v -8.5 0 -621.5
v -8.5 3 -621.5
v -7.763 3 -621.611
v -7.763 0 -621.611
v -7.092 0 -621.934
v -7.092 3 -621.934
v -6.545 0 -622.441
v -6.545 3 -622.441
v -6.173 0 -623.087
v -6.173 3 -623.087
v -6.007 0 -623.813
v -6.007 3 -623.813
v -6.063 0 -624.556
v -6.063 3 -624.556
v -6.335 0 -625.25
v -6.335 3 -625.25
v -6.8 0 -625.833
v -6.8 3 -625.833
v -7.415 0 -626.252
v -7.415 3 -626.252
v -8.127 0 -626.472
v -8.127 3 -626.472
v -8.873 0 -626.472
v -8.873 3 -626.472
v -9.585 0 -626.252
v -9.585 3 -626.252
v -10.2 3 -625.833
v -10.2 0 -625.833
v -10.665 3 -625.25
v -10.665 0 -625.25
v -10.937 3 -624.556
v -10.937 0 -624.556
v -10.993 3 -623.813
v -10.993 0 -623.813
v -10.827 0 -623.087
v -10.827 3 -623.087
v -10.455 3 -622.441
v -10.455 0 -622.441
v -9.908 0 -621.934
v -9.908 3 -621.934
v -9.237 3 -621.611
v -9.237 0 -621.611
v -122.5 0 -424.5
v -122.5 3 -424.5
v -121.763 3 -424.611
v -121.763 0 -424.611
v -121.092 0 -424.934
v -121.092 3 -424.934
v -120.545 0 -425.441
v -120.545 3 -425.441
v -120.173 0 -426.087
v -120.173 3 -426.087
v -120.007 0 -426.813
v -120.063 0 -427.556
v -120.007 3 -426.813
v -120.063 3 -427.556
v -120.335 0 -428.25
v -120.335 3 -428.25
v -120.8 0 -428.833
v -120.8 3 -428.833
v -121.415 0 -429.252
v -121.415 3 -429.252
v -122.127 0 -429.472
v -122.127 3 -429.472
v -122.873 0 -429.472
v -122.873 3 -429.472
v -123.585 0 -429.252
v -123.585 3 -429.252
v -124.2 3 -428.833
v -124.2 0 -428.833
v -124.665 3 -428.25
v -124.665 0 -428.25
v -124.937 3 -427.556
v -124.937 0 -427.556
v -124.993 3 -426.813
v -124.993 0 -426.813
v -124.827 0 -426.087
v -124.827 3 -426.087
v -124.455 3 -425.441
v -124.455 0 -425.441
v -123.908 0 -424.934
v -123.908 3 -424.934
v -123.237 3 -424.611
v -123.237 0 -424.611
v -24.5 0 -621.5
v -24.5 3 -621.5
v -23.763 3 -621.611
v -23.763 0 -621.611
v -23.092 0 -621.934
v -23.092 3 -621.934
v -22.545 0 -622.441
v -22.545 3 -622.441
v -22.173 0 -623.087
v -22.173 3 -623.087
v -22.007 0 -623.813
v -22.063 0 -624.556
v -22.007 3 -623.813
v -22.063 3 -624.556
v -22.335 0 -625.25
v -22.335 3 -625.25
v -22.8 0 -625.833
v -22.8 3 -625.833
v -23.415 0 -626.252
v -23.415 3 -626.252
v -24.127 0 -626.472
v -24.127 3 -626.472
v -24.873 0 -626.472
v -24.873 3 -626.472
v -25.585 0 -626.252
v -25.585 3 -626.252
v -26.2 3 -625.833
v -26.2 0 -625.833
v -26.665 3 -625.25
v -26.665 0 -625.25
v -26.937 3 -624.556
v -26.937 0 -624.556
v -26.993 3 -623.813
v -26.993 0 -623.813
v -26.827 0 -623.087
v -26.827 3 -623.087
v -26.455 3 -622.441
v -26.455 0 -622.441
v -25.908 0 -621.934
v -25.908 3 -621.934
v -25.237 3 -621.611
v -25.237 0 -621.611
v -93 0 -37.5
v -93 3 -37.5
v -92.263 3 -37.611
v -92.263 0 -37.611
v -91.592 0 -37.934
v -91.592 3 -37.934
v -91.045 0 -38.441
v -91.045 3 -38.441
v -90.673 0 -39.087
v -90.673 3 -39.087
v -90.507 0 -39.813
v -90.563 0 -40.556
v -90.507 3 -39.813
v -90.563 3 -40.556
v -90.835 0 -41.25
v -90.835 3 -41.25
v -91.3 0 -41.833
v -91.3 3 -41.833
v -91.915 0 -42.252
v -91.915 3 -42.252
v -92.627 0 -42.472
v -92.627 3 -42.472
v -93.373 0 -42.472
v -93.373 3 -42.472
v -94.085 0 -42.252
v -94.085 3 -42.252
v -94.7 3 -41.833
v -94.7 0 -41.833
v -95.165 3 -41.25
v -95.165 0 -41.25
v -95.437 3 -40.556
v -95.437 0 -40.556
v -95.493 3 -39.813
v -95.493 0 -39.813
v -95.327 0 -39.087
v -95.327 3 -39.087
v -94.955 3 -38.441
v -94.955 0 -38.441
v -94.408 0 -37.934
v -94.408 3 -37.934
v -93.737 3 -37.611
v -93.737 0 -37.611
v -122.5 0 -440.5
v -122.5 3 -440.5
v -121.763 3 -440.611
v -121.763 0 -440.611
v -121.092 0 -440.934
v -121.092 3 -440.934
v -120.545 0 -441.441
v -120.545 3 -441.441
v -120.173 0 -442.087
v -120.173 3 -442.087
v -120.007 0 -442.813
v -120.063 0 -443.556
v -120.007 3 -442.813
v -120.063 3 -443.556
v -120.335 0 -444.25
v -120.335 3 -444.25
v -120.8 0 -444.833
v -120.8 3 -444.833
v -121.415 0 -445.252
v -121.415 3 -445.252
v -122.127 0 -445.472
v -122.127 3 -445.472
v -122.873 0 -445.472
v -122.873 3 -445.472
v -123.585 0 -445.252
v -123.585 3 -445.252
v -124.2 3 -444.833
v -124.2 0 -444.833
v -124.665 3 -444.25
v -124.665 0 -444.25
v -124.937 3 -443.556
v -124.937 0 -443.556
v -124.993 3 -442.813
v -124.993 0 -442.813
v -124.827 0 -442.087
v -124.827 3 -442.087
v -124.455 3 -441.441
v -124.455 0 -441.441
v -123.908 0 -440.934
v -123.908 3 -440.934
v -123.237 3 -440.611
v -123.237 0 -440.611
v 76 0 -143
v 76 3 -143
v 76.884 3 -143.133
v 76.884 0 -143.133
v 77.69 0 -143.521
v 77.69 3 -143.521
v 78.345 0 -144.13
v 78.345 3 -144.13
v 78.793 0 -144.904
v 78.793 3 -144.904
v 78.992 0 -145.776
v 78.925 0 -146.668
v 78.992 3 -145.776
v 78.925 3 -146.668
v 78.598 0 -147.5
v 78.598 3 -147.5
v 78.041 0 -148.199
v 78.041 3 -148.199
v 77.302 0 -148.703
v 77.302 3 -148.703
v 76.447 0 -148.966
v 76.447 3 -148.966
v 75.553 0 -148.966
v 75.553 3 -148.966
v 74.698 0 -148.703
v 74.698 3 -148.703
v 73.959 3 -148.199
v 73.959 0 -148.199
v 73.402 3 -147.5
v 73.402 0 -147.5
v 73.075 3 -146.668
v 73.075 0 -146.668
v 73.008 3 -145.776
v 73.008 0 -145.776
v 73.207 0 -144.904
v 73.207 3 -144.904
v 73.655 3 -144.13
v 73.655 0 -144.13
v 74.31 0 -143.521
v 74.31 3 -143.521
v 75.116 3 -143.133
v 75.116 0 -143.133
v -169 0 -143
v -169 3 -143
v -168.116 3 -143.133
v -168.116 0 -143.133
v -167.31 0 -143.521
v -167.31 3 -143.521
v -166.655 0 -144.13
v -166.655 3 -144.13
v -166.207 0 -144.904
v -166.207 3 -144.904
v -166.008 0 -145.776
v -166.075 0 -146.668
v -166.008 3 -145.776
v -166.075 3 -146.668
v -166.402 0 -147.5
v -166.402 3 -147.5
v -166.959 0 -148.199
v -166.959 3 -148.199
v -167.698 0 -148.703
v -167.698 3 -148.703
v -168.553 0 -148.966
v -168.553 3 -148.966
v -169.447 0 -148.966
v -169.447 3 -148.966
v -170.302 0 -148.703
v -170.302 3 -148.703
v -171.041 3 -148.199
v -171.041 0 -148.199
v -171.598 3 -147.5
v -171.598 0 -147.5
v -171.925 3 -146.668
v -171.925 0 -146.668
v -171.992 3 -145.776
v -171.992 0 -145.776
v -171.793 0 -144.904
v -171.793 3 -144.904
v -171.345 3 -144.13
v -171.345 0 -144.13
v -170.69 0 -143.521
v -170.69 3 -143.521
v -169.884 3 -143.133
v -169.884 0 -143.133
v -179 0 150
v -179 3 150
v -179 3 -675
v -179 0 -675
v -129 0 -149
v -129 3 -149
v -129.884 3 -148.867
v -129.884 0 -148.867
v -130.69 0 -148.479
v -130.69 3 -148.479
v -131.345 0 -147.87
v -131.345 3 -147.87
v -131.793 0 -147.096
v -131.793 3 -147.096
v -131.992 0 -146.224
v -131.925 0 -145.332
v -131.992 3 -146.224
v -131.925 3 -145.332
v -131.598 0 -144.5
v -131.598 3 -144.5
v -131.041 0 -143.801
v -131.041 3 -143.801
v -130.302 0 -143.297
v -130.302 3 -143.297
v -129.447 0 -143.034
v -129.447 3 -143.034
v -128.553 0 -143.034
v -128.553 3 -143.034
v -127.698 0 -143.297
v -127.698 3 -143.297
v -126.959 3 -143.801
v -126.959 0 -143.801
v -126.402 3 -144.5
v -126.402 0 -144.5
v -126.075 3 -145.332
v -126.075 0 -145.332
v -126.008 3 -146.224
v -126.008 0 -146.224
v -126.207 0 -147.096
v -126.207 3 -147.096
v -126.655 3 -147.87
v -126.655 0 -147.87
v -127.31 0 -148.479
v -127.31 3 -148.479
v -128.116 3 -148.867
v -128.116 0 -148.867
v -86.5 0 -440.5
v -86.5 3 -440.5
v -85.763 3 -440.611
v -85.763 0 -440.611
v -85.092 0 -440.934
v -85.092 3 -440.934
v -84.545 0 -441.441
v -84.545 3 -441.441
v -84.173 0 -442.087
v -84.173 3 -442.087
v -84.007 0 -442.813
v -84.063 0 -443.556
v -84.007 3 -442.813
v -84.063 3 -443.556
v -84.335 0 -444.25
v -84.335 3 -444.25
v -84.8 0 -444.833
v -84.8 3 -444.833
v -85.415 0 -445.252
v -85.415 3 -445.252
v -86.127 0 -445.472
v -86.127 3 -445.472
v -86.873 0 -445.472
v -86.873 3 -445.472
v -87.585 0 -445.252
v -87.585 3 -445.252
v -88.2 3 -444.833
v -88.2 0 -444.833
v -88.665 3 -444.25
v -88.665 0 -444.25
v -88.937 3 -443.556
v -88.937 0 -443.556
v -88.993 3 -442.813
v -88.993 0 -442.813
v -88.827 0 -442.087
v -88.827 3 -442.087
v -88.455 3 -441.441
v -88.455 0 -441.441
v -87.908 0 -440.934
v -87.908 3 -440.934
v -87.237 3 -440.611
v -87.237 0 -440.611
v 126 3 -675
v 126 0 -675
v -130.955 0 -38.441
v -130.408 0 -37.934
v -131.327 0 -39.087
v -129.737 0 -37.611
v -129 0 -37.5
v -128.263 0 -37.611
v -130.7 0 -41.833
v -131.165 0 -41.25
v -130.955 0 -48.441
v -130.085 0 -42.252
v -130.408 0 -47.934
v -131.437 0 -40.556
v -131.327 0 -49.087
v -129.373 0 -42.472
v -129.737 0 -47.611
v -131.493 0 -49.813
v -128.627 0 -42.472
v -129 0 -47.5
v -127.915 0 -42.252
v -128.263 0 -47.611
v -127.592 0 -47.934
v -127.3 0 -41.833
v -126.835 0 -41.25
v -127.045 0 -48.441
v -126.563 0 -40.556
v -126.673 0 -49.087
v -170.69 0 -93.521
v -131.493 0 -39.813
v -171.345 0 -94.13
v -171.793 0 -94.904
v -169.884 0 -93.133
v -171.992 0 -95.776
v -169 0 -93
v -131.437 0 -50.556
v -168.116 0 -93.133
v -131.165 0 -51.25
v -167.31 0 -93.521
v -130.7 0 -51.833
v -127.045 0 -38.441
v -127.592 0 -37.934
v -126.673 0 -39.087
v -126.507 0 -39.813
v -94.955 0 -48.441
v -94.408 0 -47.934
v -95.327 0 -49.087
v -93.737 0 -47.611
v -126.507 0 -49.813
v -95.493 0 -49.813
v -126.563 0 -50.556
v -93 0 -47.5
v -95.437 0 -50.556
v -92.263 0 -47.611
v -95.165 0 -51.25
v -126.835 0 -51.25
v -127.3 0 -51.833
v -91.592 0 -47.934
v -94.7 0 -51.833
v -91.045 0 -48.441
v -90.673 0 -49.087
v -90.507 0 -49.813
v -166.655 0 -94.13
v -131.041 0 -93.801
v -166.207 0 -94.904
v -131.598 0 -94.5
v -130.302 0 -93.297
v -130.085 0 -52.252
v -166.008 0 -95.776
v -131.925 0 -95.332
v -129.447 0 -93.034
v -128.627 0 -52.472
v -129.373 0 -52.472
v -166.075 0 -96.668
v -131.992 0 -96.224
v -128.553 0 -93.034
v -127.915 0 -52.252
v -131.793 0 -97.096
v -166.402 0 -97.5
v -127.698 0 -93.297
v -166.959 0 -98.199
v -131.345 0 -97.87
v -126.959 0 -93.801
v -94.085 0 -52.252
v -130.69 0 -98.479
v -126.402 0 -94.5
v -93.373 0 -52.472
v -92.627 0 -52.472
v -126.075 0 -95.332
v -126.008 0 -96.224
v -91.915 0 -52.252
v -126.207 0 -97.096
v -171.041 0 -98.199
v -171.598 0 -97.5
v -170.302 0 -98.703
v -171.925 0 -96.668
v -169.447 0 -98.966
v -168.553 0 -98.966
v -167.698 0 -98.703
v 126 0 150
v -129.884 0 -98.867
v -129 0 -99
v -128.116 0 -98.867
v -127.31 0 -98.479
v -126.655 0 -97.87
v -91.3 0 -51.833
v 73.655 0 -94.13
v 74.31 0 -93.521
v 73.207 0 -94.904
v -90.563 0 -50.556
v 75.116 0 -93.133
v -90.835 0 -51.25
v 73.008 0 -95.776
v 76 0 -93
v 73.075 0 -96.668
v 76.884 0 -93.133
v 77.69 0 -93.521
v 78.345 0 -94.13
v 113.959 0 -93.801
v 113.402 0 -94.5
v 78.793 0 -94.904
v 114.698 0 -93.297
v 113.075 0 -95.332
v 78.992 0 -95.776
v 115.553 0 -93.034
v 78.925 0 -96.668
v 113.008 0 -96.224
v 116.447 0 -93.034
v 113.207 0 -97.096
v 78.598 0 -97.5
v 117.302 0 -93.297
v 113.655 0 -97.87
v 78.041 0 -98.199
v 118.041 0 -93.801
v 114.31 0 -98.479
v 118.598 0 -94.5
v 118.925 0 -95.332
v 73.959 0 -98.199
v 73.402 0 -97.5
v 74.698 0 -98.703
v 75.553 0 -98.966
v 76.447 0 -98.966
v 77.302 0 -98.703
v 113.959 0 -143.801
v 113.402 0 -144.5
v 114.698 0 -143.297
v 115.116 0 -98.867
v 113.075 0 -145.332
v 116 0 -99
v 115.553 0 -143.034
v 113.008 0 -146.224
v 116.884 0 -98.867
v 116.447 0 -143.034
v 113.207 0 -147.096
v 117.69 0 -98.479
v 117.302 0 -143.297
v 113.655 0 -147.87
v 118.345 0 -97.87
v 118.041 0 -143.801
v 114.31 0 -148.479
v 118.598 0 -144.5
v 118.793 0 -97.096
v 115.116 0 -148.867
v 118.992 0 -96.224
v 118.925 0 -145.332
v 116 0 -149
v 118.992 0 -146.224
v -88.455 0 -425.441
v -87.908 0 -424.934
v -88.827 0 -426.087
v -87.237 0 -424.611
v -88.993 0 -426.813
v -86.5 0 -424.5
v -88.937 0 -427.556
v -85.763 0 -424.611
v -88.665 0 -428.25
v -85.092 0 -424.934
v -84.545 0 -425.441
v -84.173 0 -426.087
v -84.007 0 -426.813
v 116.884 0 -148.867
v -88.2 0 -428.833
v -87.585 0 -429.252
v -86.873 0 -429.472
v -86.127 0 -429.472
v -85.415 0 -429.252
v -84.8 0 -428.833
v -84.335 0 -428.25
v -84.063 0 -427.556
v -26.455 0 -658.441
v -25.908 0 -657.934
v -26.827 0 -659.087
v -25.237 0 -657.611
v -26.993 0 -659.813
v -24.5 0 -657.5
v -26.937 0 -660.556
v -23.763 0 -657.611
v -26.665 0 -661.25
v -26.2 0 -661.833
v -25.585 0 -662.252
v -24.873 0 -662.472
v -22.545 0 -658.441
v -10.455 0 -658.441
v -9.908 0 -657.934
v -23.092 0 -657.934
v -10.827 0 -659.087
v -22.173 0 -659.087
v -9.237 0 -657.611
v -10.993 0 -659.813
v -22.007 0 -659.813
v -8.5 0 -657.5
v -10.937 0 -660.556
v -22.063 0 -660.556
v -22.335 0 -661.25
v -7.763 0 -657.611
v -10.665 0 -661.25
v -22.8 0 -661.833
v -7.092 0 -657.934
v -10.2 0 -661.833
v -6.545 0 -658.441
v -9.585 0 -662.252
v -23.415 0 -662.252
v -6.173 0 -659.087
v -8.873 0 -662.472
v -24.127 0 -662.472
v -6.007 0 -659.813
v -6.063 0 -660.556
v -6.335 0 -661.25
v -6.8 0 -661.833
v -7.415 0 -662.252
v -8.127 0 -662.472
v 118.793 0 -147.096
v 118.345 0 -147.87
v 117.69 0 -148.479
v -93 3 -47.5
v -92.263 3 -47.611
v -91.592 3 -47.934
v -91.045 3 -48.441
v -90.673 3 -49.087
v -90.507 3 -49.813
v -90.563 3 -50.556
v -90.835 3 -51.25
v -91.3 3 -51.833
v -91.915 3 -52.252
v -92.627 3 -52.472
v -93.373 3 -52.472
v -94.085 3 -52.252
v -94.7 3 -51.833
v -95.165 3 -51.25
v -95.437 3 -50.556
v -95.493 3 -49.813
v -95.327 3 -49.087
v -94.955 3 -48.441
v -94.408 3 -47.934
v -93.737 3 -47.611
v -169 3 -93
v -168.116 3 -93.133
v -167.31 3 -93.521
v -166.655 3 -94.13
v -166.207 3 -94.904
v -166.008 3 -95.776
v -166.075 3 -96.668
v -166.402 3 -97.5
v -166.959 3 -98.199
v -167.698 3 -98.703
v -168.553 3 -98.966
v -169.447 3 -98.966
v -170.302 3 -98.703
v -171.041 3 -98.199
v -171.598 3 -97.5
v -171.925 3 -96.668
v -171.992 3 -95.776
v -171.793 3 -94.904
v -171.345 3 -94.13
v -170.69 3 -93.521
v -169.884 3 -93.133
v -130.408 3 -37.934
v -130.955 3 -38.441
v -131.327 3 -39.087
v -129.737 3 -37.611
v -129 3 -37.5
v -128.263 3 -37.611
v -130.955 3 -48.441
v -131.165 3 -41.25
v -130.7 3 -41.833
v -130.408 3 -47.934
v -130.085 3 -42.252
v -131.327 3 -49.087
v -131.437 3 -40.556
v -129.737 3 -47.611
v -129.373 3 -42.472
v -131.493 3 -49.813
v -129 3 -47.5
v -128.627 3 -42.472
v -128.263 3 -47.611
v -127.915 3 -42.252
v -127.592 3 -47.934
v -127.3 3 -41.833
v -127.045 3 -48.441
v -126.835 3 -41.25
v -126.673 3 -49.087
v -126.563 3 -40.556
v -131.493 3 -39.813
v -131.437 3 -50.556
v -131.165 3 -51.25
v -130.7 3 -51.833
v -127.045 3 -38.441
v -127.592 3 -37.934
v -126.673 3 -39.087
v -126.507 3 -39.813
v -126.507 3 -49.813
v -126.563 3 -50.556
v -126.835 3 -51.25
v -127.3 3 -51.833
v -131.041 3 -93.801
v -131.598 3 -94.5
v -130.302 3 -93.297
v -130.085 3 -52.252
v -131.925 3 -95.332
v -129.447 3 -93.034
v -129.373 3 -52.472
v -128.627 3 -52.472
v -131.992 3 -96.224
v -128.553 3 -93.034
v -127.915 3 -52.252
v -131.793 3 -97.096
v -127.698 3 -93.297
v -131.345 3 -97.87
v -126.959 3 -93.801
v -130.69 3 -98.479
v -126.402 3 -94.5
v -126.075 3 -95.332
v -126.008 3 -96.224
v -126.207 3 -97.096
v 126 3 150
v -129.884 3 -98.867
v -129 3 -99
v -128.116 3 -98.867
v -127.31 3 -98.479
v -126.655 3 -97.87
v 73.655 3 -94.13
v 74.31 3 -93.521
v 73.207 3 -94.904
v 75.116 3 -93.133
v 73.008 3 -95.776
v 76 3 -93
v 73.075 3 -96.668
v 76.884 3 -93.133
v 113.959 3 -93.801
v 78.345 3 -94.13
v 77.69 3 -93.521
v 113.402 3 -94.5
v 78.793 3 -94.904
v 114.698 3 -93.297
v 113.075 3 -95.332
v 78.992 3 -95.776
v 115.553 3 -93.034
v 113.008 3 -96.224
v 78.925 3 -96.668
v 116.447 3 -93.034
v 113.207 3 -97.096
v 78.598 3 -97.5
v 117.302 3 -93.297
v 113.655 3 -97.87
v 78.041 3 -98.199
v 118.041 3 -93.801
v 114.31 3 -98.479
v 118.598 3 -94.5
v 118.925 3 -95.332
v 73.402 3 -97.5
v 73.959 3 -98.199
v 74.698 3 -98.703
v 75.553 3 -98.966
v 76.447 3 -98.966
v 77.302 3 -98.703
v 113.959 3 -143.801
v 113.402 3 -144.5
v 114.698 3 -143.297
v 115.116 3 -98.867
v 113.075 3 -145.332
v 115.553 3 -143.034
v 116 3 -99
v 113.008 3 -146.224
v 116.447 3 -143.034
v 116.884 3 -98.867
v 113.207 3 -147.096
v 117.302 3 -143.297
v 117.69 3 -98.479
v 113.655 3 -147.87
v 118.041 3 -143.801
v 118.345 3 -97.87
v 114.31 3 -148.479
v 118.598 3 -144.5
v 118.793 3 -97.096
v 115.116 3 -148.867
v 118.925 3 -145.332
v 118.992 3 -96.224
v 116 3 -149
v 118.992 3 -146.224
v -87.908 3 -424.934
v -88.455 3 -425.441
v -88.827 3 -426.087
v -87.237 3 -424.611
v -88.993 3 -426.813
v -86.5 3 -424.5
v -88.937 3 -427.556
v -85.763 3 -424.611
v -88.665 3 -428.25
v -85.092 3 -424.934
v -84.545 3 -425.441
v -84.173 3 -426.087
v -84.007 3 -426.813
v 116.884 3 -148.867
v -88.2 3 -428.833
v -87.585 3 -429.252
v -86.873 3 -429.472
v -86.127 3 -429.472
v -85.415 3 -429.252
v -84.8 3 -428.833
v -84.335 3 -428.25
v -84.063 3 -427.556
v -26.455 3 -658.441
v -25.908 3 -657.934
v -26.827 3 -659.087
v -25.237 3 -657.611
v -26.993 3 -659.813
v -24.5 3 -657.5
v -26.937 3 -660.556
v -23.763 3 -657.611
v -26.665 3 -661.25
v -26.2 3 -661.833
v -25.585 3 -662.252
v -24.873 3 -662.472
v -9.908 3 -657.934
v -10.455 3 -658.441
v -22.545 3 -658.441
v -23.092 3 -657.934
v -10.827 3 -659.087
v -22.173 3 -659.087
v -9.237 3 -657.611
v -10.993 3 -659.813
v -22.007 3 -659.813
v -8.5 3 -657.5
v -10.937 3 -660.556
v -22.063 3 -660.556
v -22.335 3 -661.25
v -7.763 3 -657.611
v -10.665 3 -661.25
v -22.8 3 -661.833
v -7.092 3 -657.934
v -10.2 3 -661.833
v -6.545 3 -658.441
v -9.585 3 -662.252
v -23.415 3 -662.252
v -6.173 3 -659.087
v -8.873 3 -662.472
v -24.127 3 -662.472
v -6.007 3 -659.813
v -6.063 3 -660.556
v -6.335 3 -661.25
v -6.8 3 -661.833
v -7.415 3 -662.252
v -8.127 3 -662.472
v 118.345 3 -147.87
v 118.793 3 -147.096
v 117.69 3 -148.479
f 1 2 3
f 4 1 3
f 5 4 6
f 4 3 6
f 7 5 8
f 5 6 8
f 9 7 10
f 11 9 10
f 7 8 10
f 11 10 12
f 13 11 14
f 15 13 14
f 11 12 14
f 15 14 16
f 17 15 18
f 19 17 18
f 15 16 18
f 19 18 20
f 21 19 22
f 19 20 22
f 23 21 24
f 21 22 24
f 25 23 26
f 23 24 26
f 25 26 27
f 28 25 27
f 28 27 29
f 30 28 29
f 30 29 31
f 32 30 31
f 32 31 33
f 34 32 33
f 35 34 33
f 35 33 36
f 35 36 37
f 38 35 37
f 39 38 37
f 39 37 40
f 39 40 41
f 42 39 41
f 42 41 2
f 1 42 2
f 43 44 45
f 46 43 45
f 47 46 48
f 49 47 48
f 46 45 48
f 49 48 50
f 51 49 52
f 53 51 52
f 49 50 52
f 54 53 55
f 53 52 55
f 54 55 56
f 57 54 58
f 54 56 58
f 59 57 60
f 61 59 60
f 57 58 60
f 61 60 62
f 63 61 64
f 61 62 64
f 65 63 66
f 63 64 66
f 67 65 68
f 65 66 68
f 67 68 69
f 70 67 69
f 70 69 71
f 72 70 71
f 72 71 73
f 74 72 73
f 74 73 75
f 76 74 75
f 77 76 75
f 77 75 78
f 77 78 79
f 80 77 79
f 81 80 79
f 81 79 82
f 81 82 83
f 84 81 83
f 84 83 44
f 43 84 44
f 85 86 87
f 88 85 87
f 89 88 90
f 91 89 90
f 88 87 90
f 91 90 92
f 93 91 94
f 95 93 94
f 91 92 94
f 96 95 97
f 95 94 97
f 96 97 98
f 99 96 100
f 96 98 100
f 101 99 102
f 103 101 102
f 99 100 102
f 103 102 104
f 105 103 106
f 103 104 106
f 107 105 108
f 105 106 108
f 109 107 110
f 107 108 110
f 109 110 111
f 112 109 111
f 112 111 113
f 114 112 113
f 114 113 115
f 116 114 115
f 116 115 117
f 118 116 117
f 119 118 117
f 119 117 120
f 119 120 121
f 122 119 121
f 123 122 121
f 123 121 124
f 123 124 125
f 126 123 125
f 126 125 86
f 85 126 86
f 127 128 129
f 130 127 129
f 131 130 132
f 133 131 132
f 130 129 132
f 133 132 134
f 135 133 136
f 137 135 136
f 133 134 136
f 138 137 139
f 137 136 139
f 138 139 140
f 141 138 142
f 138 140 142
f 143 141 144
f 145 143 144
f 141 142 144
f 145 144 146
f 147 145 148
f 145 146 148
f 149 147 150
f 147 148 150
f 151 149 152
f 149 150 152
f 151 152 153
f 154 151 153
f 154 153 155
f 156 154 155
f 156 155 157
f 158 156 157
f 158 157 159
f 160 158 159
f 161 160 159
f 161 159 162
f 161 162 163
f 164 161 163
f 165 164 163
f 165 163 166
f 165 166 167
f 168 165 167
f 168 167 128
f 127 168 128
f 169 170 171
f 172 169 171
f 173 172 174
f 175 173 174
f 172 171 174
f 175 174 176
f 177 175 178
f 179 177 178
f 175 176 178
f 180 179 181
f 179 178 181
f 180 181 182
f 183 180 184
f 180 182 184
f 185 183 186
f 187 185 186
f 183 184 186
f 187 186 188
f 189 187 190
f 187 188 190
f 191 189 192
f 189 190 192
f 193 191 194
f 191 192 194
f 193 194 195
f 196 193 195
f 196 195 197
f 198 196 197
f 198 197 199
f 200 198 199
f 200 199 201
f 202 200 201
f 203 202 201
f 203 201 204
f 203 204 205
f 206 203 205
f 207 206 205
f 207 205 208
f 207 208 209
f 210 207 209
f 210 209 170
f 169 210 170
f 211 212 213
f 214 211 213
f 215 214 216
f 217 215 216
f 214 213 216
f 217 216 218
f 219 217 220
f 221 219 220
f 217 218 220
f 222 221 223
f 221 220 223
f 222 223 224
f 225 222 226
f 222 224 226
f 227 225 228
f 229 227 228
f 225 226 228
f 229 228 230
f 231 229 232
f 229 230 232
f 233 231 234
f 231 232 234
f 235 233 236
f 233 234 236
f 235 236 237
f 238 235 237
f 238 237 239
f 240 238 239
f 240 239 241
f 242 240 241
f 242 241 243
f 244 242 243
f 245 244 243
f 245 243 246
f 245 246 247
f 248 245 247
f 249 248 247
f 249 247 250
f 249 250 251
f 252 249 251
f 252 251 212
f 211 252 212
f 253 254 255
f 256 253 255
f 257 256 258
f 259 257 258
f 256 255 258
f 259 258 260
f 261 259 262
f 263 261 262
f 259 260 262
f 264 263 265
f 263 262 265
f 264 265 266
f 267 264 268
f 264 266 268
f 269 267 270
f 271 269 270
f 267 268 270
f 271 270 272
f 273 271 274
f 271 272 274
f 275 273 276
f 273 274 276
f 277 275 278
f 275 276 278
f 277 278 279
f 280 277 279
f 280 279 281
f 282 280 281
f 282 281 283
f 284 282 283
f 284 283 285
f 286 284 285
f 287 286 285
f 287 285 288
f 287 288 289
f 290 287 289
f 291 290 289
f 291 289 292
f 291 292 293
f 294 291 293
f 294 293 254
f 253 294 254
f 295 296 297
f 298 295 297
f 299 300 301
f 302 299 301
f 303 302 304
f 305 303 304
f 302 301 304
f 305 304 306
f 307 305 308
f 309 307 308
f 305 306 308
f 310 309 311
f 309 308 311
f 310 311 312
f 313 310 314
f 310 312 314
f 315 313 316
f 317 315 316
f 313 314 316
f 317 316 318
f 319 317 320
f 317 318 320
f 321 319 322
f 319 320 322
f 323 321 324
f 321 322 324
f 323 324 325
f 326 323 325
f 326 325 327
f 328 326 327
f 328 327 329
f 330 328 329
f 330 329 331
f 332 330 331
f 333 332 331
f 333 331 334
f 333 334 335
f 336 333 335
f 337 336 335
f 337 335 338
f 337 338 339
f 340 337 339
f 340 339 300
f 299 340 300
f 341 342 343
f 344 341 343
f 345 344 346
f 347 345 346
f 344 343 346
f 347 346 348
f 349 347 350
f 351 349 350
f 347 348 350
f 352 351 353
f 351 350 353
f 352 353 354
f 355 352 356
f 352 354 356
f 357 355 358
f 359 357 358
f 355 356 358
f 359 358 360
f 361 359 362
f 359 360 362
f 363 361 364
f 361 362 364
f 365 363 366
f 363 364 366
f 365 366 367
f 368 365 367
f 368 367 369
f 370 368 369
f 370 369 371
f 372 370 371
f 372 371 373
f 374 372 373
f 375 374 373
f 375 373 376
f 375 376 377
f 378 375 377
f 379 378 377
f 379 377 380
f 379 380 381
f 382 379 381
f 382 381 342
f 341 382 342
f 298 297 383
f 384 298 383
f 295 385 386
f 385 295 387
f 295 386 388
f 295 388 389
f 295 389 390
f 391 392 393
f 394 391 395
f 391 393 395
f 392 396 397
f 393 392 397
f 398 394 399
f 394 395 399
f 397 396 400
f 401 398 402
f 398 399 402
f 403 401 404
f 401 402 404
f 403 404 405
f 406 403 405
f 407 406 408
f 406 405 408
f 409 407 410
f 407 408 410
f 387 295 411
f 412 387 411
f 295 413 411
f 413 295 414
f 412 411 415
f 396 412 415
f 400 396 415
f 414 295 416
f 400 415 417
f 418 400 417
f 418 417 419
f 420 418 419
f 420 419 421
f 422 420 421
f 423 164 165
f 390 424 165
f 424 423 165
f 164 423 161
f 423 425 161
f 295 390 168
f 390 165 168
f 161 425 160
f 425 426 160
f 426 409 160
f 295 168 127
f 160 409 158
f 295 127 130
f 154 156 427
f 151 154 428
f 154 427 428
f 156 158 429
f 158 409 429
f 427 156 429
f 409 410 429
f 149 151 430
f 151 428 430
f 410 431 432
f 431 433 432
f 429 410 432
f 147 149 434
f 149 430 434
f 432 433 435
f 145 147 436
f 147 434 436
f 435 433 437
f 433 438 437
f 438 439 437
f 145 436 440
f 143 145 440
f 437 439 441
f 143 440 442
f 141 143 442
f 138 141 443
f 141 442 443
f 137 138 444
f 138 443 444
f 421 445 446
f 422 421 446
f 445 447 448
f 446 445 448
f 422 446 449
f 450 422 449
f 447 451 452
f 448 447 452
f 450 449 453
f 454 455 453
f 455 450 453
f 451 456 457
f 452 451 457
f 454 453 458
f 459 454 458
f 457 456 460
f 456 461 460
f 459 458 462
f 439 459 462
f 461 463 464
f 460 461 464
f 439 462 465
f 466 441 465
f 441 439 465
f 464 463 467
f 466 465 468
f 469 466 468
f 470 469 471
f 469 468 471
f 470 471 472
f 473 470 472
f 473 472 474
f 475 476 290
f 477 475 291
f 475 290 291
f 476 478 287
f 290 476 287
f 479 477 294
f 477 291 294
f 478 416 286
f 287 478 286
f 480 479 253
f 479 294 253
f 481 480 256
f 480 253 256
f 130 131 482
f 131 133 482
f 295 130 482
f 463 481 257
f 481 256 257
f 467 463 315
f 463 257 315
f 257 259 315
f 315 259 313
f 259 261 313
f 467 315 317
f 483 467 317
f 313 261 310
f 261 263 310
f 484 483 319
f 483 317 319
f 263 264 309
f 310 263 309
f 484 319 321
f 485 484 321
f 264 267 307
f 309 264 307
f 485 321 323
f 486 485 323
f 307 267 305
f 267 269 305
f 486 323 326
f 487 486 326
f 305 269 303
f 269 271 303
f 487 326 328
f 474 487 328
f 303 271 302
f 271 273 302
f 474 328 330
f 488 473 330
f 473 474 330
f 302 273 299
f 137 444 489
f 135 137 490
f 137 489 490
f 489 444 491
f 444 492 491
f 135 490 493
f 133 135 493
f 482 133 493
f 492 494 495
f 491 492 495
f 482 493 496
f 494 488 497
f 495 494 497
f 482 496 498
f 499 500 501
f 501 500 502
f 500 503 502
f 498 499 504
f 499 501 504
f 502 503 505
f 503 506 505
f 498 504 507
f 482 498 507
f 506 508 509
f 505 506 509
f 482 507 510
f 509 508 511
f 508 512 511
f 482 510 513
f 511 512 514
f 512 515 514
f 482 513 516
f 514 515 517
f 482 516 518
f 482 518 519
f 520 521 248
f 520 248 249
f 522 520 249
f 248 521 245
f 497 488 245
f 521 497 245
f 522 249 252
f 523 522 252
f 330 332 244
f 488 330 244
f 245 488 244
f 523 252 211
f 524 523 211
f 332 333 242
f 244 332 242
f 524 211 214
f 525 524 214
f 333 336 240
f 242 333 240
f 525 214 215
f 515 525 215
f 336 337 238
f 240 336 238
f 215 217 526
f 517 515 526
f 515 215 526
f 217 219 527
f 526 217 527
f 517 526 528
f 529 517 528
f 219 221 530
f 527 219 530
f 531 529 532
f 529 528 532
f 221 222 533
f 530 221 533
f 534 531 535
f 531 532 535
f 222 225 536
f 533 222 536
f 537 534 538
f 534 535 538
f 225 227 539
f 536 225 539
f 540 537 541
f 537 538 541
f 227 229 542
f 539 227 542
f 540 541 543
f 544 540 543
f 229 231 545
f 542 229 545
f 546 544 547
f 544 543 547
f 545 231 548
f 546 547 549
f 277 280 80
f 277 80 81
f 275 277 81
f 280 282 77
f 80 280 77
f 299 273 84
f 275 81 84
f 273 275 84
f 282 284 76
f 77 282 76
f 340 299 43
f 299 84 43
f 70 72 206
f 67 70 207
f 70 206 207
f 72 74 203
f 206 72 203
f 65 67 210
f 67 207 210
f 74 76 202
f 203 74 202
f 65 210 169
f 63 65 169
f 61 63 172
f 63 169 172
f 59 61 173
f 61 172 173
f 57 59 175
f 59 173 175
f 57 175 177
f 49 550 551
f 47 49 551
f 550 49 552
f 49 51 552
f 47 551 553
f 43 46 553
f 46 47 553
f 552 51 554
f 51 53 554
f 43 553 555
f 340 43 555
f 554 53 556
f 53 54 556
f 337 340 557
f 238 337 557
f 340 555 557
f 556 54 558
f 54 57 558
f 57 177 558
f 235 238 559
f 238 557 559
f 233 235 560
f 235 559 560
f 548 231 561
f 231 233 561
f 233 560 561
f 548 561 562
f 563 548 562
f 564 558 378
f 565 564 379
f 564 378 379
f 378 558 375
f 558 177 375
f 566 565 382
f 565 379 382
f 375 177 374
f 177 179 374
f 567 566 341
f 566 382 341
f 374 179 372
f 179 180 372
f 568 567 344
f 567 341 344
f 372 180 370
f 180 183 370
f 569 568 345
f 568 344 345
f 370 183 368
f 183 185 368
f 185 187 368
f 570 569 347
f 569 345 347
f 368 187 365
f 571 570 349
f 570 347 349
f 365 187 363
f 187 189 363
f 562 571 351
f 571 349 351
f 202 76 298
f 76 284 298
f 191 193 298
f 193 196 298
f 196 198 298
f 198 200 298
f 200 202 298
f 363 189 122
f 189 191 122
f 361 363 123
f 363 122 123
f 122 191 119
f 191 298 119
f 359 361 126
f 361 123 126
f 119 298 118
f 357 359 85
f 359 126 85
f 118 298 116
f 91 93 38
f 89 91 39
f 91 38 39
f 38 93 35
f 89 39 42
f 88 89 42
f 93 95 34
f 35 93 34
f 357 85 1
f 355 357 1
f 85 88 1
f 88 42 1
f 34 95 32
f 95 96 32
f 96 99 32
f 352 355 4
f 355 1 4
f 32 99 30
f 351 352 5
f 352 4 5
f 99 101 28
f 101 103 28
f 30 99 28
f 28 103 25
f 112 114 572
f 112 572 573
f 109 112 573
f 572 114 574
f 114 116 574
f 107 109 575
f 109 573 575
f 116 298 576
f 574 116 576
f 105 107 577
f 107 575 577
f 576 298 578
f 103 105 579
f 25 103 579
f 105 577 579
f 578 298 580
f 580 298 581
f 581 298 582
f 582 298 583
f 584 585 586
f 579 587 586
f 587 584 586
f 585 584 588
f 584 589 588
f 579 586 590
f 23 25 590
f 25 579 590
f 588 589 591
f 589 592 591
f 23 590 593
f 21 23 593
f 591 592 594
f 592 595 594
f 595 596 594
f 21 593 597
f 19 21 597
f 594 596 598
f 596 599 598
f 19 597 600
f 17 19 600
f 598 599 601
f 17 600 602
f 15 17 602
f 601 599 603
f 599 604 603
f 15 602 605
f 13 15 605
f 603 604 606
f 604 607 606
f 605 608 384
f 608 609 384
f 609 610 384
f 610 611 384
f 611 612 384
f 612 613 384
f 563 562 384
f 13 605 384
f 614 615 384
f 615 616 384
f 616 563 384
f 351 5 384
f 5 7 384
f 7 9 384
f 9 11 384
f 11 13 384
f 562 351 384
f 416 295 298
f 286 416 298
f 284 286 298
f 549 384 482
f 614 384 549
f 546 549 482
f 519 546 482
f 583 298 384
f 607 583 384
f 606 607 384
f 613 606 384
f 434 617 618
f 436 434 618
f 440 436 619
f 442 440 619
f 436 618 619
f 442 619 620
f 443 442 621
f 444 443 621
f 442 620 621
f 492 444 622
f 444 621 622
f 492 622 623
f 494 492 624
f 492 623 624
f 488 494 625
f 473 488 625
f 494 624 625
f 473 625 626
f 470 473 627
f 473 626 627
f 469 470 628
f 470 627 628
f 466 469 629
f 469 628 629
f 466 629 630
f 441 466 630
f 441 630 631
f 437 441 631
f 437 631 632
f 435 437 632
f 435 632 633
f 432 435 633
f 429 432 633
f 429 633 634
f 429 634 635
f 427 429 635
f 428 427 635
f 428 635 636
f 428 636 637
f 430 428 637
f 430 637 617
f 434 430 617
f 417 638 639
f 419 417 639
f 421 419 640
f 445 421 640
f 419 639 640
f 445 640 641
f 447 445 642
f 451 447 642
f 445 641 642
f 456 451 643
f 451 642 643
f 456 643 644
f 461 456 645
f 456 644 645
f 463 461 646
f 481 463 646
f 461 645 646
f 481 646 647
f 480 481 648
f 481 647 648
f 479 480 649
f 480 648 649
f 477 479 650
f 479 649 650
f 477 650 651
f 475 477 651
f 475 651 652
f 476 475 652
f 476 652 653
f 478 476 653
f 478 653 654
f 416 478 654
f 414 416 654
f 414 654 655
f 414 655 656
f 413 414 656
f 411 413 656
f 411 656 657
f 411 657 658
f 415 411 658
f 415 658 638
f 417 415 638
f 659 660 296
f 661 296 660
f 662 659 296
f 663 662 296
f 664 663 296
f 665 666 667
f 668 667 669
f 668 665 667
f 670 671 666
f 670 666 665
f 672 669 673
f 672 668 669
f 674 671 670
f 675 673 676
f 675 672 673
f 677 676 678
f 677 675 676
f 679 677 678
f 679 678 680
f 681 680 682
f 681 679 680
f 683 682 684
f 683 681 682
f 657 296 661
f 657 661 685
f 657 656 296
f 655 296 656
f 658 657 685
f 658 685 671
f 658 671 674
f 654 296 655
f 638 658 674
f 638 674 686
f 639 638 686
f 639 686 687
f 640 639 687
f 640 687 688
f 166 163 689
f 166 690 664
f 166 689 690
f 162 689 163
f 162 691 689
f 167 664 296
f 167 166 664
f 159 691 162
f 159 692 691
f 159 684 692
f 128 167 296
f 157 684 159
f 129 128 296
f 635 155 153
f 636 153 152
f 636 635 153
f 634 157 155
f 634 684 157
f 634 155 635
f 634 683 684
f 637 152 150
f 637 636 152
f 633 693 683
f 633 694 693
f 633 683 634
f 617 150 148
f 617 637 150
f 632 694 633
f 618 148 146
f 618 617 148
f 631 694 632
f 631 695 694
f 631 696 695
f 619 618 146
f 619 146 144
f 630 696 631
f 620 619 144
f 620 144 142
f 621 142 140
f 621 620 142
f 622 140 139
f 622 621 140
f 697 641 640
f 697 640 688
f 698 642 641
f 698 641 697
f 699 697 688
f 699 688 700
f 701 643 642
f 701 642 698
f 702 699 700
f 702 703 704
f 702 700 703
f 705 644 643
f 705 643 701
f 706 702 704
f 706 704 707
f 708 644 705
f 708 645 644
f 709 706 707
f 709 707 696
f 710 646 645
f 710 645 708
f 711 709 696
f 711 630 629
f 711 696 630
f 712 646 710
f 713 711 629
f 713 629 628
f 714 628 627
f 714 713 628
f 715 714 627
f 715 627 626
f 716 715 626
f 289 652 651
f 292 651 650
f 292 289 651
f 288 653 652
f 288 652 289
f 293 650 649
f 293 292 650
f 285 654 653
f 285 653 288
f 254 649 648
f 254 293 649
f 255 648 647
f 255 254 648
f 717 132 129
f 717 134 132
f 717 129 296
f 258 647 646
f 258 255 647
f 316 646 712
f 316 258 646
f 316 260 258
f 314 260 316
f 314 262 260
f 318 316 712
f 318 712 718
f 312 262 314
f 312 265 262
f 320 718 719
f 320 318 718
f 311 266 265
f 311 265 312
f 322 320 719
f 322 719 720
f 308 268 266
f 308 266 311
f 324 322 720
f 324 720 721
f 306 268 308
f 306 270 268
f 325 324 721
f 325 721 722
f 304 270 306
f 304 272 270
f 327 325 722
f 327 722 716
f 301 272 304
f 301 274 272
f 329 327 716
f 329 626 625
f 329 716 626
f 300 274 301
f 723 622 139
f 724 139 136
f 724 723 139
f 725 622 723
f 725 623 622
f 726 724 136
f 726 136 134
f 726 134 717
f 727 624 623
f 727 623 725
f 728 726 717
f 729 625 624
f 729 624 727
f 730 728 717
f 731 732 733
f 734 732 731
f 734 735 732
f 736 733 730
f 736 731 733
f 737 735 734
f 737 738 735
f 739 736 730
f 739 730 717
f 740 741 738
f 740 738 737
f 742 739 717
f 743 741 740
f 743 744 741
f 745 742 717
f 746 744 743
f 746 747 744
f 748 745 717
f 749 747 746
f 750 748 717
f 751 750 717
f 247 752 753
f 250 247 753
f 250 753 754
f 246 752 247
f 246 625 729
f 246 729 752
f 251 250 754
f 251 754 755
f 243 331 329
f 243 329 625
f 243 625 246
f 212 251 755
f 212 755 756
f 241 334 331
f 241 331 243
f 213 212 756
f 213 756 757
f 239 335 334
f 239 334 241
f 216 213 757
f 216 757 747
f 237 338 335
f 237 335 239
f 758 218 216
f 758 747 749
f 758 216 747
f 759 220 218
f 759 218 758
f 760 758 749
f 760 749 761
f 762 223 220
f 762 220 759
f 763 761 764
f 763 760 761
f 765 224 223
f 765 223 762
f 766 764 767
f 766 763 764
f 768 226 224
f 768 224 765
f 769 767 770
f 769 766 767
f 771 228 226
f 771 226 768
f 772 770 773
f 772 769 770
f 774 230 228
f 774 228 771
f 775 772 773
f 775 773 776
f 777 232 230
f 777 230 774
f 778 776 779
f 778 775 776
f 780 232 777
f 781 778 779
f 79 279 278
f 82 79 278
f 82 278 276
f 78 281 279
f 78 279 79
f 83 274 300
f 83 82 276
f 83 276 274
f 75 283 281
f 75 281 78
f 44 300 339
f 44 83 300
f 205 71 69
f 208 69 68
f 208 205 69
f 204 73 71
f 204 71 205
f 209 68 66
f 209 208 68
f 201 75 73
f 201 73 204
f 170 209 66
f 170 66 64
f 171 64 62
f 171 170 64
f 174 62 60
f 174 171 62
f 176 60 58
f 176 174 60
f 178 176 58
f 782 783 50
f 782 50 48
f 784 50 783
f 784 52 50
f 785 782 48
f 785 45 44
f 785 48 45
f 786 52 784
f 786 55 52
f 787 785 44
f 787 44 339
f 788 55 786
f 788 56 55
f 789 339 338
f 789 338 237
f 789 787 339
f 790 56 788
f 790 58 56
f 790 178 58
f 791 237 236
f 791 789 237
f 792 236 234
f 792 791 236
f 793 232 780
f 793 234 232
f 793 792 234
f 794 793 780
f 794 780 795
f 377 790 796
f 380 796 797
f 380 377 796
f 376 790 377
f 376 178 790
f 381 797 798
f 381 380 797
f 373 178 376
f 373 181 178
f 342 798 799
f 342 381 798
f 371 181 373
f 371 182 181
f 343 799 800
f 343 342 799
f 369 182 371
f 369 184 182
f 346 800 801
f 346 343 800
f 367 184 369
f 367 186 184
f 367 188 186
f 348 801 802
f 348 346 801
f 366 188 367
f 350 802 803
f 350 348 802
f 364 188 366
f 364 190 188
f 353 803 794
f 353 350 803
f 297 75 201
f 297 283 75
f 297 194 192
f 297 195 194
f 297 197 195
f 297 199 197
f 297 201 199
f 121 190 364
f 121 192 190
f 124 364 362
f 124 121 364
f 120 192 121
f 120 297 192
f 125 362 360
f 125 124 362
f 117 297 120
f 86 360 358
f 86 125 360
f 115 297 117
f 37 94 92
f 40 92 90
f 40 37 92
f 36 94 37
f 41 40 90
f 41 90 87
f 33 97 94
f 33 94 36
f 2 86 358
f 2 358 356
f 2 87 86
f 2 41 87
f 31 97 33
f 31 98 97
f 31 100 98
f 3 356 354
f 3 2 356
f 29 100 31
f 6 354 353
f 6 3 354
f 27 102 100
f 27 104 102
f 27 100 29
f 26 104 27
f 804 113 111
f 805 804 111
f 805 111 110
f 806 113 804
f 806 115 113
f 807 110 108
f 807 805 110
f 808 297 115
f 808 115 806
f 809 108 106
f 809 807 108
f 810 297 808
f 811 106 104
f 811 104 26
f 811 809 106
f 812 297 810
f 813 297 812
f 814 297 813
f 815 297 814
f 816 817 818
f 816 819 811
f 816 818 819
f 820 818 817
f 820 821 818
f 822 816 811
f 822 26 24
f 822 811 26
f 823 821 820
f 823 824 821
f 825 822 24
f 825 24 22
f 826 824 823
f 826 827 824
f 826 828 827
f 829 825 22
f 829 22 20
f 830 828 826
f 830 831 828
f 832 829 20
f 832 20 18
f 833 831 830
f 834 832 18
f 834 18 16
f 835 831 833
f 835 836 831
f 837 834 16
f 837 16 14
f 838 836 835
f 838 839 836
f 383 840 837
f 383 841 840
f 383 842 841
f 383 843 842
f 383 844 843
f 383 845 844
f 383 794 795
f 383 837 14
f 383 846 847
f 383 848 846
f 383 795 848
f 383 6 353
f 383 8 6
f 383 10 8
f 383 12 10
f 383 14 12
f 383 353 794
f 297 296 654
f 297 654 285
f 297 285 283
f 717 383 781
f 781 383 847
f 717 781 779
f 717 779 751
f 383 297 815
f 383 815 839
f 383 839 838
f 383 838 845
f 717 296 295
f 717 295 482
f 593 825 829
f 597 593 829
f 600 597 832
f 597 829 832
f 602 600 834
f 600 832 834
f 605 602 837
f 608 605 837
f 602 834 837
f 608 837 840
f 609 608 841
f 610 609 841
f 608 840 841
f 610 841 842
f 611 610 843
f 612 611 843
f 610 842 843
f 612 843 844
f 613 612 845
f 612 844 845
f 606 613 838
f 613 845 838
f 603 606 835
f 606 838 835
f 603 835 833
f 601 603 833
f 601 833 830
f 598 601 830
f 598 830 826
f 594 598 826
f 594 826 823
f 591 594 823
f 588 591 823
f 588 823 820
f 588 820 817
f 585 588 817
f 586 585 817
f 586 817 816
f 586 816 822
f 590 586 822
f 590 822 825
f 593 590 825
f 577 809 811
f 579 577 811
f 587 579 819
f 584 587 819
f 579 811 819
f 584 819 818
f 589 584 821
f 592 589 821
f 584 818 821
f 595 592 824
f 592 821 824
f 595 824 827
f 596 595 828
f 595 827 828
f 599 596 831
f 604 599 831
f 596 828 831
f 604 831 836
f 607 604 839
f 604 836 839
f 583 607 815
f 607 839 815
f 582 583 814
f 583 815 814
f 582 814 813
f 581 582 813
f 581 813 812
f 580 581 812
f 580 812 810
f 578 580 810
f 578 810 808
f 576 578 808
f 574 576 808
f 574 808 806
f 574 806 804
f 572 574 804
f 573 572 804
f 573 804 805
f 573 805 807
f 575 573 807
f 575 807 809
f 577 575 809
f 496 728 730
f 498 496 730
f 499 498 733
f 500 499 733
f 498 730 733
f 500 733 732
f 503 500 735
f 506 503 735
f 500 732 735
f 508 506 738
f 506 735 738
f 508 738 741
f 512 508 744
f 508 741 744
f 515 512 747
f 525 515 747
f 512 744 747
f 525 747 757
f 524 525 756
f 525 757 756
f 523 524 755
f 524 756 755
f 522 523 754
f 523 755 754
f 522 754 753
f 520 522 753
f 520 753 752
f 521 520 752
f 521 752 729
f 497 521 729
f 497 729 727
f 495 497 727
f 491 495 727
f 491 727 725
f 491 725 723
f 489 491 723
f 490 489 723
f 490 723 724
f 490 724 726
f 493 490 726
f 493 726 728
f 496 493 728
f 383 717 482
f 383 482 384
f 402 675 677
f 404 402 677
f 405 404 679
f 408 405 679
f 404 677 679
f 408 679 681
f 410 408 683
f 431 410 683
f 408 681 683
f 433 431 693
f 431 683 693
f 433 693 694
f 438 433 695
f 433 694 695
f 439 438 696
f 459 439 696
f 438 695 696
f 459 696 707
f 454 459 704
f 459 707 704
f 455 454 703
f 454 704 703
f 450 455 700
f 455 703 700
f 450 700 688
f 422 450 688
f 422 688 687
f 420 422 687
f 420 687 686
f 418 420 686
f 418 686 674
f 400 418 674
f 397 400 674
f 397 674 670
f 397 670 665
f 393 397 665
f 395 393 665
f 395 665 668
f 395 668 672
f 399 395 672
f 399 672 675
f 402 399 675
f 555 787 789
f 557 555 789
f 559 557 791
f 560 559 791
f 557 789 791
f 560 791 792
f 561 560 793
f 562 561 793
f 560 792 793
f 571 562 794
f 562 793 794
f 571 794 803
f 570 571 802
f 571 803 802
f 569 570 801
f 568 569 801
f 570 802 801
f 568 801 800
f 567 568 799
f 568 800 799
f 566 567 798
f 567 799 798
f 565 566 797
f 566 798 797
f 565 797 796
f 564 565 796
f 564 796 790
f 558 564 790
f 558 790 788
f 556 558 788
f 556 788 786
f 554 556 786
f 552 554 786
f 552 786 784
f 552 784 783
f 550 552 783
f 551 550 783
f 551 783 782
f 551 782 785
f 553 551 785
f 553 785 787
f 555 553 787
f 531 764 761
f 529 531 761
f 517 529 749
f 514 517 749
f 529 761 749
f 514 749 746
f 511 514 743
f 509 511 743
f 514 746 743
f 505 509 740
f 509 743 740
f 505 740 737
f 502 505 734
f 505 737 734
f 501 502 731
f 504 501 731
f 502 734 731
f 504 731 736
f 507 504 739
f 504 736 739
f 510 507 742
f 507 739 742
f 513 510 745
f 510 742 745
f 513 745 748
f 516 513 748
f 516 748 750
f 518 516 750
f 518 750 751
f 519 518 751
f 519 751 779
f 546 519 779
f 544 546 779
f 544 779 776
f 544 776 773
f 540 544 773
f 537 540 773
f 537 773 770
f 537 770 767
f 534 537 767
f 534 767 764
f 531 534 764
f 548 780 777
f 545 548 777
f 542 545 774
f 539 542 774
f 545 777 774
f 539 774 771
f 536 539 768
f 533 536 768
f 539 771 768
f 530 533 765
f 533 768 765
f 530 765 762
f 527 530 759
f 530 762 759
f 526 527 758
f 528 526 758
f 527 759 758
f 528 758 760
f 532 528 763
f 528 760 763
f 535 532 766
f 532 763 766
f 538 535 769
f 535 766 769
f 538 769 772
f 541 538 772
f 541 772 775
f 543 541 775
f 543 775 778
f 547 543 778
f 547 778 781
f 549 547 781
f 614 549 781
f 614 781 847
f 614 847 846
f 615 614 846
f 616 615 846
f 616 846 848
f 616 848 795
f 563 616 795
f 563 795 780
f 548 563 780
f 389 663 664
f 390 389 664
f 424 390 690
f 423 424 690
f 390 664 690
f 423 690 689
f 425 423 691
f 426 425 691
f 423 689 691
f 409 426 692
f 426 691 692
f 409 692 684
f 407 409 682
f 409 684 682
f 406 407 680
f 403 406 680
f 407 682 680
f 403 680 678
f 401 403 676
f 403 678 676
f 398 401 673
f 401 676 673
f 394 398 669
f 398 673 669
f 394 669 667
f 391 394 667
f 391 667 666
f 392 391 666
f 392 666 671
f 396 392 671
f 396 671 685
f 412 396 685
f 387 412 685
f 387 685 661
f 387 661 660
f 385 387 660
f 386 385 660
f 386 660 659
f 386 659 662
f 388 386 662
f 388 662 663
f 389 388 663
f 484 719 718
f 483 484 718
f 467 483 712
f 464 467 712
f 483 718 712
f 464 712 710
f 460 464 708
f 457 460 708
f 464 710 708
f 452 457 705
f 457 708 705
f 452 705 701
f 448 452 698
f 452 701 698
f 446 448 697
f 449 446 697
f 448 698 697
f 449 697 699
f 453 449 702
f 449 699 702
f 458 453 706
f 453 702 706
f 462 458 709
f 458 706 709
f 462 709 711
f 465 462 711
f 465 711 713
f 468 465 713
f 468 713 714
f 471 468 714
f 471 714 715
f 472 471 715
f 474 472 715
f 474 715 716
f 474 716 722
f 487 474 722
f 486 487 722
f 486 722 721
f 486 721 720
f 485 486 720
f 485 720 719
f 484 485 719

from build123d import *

# Parameters (mm, degrees)
BOSS_EXTRUDE1_DEPTH = 3
SKETCH2_R           = 2.5
CUT_EXTRUDE3_DEPTH  = 20
SKETCH3_W           = 289
SKETCH3_H           = 3
BOSS_EXTRUDE2_DEPTH = 600
SKETCH4_R           = 2.5
CUT_EXTRUDE4_DEPTH  = 10
SKETCH5_W           = 289
SKETCH5_H           = 75
CUT_EXTRUDE5_DEPTH  = 10
SKETCH6_R           = 2.5
CUT_EXTRUDE6_DEPTH  = 5
SKETCH7_W           = 8
SKETCH7_H           = 825
BOSS_EXTRUDE3_DEPTH = 3
SKETCH8_R           = 3
CUT_EXTRUDE7_DEPTH  = 699.337311047


with BuildPart() as part:
    # Sketch1 → Boss-Extrude1 (new body)
    with BuildSketch(Plane(origin=(0, 0, 0), x_dir=(1, 0, 0), z_dir=(0, 1, 0))):
        Polygon((-118, 150), (-171, 150), (-171, -150), (-118, -150), (118, -150), (118, 150), align=None)
    extrude(amount=BOSS_EXTRUDE1_DEPTH)

    # Sketch2 → Cut-Extrude3 (cut)
    with BuildSketch(Plane(origin=(0, 3, 0), x_dir=(1, 0, 0), z_dir=(0, 1, 0))):
        with Locations(Location((-129, 50, 0), (0, 0, 270))):
            Circle(SKETCH2_R)
        with Locations(Location((-129, 40, 0), (0, 0, 270))):
            Circle(SKETCH2_R)
        with Locations(Location((-93, 40, 0), (0, 0, 270))):
            Circle(SKETCH2_R)
        with Locations(Location((-93, 50, 0), (0, 0, 270))):
            Circle(SKETCH2_R)
    extrude(amount=-CUT_EXTRUDE3_DEPTH, mode=Mode.SUBTRACT)

    # Sketch3 → Boss-Extrude2 (add)
    with BuildSketch(Plane(origin=(0, 0, -150), x_dir=(-1, 0, 0), z_dir=(0, 0, -1))):
        with Locations((26.5, 1.5)):
            Rectangle(SKETCH3_W, SKETCH3_H)
    extrude(amount=BOSS_EXTRUDE2_DEPTH)

    # Sketch4 → Cut-Extrude4 (cut)
    with BuildSketch(Plane(origin=(0, 3, 0), x_dir=(1, 0, 0), z_dir=(0, 1, 0))):
        with Locations(Location((-8.5, 660, 0), (0, 0, 270))):
            Circle(SKETCH4_R)
        with Locations(Location((-8.5, 624, 0), (0, 0, 270))):
            Circle(SKETCH4_R)
        with Locations(Location((-24.5, 624, 0), (0, 0, 270))):
            Circle(SKETCH4_R)
        with Locations(Location((-24.5, 660, 0), (0, 0, 270))):
            Circle(SKETCH4_R)
    extrude(amount=-CUT_EXTRUDE4_DEPTH, mode=Mode.SUBTRACT)

    # Sketch5 → Cut-Extrude5 (cut)
    with BuildSketch(Plane(origin=(0, 3, 0), x_dir=(1, 0, 0), z_dir=(0, 1, 0))):
        with Locations((-26.5, 712.5)):
            Rectangle(SKETCH5_W, SKETCH5_H)
    extrude(amount=-CUT_EXTRUDE5_DEPTH, mode=Mode.SUBTRACT)

    # Sketch6 → Cut-Extrude6 (cut)
    with BuildSketch(Plane(origin=(0, 3, 0), x_dir=(1, 0, 0), z_dir=(0, 1, 0))):
        with Locations(Location((-86.5, 443, 0), (0, 0, 270))):
            Circle(SKETCH6_R)
        with Locations(Location((-86.5, 427, 0), (0, 0, 270))):
            Circle(SKETCH6_R)
        with Locations(Location((-122.5, 427, 0), (0, 0, 270))):
            Circle(SKETCH6_R)
        with Locations(Location((-122.5, 443, 0), (0, 0, 270))):
            Circle(SKETCH6_R)
    extrude(amount=-CUT_EXTRUDE6_DEPTH, mode=Mode.SUBTRACT)

    # Sketch7 → Boss-Extrude3 (add, through all)
    with BuildSketch(Plane(origin=(0, 3, 0), x_dir=(1, 0, 0), z_dir=(0, 1, 0))):
        with Locations((-175, 262.5)):
            Rectangle(SKETCH7_W, SKETCH7_H)
        with Locations((122, 262.5)):
            Rectangle(SKETCH7_W, SKETCH7_H)
    extrude(amount=-BOSS_EXTRUDE3_DEPTH)

    # Sketch8 → Cut-Extrude7 (cut, through all)
    with BuildSketch(Plane(origin=(0, 3, 0), x_dir=(1, 0, 0), z_dir=(0, 1, 0))):
        with Locations(Location((-169, 96, 0), (0, 0, 270))):
            Circle(SKETCH8_R)
        with Locations(Location((-169, 146, 0), (0, 0, 270))):
            Circle(SKETCH8_R)
        with Locations(Location((-129, 96, 0), (0, 0, 90))):
            Circle(SKETCH8_R)
        with Locations(Location((-129, 146, 0), (0, 0, 90))):
            Circle(SKETCH8_R)
        with Locations(Location((116, 96, 0), (0, 0, 90))):
            Circle(SKETCH8_R)
        with Locations(Location((76, 96, 0), (0, 0, 270))):
            Circle(SKETCH8_R)
        with Locations(Location((76, 146, 0), (0, 0, 270))):
            Circle(SKETCH8_R)
        with Locations(Location((116, 146, 0), (0, 0, 90))):
            Circle(SKETCH8_R)
    extrude(amount=-CUT_EXTRUDE7_DEPTH, mode=Mode.SUBTRACT)


solid = part.part
